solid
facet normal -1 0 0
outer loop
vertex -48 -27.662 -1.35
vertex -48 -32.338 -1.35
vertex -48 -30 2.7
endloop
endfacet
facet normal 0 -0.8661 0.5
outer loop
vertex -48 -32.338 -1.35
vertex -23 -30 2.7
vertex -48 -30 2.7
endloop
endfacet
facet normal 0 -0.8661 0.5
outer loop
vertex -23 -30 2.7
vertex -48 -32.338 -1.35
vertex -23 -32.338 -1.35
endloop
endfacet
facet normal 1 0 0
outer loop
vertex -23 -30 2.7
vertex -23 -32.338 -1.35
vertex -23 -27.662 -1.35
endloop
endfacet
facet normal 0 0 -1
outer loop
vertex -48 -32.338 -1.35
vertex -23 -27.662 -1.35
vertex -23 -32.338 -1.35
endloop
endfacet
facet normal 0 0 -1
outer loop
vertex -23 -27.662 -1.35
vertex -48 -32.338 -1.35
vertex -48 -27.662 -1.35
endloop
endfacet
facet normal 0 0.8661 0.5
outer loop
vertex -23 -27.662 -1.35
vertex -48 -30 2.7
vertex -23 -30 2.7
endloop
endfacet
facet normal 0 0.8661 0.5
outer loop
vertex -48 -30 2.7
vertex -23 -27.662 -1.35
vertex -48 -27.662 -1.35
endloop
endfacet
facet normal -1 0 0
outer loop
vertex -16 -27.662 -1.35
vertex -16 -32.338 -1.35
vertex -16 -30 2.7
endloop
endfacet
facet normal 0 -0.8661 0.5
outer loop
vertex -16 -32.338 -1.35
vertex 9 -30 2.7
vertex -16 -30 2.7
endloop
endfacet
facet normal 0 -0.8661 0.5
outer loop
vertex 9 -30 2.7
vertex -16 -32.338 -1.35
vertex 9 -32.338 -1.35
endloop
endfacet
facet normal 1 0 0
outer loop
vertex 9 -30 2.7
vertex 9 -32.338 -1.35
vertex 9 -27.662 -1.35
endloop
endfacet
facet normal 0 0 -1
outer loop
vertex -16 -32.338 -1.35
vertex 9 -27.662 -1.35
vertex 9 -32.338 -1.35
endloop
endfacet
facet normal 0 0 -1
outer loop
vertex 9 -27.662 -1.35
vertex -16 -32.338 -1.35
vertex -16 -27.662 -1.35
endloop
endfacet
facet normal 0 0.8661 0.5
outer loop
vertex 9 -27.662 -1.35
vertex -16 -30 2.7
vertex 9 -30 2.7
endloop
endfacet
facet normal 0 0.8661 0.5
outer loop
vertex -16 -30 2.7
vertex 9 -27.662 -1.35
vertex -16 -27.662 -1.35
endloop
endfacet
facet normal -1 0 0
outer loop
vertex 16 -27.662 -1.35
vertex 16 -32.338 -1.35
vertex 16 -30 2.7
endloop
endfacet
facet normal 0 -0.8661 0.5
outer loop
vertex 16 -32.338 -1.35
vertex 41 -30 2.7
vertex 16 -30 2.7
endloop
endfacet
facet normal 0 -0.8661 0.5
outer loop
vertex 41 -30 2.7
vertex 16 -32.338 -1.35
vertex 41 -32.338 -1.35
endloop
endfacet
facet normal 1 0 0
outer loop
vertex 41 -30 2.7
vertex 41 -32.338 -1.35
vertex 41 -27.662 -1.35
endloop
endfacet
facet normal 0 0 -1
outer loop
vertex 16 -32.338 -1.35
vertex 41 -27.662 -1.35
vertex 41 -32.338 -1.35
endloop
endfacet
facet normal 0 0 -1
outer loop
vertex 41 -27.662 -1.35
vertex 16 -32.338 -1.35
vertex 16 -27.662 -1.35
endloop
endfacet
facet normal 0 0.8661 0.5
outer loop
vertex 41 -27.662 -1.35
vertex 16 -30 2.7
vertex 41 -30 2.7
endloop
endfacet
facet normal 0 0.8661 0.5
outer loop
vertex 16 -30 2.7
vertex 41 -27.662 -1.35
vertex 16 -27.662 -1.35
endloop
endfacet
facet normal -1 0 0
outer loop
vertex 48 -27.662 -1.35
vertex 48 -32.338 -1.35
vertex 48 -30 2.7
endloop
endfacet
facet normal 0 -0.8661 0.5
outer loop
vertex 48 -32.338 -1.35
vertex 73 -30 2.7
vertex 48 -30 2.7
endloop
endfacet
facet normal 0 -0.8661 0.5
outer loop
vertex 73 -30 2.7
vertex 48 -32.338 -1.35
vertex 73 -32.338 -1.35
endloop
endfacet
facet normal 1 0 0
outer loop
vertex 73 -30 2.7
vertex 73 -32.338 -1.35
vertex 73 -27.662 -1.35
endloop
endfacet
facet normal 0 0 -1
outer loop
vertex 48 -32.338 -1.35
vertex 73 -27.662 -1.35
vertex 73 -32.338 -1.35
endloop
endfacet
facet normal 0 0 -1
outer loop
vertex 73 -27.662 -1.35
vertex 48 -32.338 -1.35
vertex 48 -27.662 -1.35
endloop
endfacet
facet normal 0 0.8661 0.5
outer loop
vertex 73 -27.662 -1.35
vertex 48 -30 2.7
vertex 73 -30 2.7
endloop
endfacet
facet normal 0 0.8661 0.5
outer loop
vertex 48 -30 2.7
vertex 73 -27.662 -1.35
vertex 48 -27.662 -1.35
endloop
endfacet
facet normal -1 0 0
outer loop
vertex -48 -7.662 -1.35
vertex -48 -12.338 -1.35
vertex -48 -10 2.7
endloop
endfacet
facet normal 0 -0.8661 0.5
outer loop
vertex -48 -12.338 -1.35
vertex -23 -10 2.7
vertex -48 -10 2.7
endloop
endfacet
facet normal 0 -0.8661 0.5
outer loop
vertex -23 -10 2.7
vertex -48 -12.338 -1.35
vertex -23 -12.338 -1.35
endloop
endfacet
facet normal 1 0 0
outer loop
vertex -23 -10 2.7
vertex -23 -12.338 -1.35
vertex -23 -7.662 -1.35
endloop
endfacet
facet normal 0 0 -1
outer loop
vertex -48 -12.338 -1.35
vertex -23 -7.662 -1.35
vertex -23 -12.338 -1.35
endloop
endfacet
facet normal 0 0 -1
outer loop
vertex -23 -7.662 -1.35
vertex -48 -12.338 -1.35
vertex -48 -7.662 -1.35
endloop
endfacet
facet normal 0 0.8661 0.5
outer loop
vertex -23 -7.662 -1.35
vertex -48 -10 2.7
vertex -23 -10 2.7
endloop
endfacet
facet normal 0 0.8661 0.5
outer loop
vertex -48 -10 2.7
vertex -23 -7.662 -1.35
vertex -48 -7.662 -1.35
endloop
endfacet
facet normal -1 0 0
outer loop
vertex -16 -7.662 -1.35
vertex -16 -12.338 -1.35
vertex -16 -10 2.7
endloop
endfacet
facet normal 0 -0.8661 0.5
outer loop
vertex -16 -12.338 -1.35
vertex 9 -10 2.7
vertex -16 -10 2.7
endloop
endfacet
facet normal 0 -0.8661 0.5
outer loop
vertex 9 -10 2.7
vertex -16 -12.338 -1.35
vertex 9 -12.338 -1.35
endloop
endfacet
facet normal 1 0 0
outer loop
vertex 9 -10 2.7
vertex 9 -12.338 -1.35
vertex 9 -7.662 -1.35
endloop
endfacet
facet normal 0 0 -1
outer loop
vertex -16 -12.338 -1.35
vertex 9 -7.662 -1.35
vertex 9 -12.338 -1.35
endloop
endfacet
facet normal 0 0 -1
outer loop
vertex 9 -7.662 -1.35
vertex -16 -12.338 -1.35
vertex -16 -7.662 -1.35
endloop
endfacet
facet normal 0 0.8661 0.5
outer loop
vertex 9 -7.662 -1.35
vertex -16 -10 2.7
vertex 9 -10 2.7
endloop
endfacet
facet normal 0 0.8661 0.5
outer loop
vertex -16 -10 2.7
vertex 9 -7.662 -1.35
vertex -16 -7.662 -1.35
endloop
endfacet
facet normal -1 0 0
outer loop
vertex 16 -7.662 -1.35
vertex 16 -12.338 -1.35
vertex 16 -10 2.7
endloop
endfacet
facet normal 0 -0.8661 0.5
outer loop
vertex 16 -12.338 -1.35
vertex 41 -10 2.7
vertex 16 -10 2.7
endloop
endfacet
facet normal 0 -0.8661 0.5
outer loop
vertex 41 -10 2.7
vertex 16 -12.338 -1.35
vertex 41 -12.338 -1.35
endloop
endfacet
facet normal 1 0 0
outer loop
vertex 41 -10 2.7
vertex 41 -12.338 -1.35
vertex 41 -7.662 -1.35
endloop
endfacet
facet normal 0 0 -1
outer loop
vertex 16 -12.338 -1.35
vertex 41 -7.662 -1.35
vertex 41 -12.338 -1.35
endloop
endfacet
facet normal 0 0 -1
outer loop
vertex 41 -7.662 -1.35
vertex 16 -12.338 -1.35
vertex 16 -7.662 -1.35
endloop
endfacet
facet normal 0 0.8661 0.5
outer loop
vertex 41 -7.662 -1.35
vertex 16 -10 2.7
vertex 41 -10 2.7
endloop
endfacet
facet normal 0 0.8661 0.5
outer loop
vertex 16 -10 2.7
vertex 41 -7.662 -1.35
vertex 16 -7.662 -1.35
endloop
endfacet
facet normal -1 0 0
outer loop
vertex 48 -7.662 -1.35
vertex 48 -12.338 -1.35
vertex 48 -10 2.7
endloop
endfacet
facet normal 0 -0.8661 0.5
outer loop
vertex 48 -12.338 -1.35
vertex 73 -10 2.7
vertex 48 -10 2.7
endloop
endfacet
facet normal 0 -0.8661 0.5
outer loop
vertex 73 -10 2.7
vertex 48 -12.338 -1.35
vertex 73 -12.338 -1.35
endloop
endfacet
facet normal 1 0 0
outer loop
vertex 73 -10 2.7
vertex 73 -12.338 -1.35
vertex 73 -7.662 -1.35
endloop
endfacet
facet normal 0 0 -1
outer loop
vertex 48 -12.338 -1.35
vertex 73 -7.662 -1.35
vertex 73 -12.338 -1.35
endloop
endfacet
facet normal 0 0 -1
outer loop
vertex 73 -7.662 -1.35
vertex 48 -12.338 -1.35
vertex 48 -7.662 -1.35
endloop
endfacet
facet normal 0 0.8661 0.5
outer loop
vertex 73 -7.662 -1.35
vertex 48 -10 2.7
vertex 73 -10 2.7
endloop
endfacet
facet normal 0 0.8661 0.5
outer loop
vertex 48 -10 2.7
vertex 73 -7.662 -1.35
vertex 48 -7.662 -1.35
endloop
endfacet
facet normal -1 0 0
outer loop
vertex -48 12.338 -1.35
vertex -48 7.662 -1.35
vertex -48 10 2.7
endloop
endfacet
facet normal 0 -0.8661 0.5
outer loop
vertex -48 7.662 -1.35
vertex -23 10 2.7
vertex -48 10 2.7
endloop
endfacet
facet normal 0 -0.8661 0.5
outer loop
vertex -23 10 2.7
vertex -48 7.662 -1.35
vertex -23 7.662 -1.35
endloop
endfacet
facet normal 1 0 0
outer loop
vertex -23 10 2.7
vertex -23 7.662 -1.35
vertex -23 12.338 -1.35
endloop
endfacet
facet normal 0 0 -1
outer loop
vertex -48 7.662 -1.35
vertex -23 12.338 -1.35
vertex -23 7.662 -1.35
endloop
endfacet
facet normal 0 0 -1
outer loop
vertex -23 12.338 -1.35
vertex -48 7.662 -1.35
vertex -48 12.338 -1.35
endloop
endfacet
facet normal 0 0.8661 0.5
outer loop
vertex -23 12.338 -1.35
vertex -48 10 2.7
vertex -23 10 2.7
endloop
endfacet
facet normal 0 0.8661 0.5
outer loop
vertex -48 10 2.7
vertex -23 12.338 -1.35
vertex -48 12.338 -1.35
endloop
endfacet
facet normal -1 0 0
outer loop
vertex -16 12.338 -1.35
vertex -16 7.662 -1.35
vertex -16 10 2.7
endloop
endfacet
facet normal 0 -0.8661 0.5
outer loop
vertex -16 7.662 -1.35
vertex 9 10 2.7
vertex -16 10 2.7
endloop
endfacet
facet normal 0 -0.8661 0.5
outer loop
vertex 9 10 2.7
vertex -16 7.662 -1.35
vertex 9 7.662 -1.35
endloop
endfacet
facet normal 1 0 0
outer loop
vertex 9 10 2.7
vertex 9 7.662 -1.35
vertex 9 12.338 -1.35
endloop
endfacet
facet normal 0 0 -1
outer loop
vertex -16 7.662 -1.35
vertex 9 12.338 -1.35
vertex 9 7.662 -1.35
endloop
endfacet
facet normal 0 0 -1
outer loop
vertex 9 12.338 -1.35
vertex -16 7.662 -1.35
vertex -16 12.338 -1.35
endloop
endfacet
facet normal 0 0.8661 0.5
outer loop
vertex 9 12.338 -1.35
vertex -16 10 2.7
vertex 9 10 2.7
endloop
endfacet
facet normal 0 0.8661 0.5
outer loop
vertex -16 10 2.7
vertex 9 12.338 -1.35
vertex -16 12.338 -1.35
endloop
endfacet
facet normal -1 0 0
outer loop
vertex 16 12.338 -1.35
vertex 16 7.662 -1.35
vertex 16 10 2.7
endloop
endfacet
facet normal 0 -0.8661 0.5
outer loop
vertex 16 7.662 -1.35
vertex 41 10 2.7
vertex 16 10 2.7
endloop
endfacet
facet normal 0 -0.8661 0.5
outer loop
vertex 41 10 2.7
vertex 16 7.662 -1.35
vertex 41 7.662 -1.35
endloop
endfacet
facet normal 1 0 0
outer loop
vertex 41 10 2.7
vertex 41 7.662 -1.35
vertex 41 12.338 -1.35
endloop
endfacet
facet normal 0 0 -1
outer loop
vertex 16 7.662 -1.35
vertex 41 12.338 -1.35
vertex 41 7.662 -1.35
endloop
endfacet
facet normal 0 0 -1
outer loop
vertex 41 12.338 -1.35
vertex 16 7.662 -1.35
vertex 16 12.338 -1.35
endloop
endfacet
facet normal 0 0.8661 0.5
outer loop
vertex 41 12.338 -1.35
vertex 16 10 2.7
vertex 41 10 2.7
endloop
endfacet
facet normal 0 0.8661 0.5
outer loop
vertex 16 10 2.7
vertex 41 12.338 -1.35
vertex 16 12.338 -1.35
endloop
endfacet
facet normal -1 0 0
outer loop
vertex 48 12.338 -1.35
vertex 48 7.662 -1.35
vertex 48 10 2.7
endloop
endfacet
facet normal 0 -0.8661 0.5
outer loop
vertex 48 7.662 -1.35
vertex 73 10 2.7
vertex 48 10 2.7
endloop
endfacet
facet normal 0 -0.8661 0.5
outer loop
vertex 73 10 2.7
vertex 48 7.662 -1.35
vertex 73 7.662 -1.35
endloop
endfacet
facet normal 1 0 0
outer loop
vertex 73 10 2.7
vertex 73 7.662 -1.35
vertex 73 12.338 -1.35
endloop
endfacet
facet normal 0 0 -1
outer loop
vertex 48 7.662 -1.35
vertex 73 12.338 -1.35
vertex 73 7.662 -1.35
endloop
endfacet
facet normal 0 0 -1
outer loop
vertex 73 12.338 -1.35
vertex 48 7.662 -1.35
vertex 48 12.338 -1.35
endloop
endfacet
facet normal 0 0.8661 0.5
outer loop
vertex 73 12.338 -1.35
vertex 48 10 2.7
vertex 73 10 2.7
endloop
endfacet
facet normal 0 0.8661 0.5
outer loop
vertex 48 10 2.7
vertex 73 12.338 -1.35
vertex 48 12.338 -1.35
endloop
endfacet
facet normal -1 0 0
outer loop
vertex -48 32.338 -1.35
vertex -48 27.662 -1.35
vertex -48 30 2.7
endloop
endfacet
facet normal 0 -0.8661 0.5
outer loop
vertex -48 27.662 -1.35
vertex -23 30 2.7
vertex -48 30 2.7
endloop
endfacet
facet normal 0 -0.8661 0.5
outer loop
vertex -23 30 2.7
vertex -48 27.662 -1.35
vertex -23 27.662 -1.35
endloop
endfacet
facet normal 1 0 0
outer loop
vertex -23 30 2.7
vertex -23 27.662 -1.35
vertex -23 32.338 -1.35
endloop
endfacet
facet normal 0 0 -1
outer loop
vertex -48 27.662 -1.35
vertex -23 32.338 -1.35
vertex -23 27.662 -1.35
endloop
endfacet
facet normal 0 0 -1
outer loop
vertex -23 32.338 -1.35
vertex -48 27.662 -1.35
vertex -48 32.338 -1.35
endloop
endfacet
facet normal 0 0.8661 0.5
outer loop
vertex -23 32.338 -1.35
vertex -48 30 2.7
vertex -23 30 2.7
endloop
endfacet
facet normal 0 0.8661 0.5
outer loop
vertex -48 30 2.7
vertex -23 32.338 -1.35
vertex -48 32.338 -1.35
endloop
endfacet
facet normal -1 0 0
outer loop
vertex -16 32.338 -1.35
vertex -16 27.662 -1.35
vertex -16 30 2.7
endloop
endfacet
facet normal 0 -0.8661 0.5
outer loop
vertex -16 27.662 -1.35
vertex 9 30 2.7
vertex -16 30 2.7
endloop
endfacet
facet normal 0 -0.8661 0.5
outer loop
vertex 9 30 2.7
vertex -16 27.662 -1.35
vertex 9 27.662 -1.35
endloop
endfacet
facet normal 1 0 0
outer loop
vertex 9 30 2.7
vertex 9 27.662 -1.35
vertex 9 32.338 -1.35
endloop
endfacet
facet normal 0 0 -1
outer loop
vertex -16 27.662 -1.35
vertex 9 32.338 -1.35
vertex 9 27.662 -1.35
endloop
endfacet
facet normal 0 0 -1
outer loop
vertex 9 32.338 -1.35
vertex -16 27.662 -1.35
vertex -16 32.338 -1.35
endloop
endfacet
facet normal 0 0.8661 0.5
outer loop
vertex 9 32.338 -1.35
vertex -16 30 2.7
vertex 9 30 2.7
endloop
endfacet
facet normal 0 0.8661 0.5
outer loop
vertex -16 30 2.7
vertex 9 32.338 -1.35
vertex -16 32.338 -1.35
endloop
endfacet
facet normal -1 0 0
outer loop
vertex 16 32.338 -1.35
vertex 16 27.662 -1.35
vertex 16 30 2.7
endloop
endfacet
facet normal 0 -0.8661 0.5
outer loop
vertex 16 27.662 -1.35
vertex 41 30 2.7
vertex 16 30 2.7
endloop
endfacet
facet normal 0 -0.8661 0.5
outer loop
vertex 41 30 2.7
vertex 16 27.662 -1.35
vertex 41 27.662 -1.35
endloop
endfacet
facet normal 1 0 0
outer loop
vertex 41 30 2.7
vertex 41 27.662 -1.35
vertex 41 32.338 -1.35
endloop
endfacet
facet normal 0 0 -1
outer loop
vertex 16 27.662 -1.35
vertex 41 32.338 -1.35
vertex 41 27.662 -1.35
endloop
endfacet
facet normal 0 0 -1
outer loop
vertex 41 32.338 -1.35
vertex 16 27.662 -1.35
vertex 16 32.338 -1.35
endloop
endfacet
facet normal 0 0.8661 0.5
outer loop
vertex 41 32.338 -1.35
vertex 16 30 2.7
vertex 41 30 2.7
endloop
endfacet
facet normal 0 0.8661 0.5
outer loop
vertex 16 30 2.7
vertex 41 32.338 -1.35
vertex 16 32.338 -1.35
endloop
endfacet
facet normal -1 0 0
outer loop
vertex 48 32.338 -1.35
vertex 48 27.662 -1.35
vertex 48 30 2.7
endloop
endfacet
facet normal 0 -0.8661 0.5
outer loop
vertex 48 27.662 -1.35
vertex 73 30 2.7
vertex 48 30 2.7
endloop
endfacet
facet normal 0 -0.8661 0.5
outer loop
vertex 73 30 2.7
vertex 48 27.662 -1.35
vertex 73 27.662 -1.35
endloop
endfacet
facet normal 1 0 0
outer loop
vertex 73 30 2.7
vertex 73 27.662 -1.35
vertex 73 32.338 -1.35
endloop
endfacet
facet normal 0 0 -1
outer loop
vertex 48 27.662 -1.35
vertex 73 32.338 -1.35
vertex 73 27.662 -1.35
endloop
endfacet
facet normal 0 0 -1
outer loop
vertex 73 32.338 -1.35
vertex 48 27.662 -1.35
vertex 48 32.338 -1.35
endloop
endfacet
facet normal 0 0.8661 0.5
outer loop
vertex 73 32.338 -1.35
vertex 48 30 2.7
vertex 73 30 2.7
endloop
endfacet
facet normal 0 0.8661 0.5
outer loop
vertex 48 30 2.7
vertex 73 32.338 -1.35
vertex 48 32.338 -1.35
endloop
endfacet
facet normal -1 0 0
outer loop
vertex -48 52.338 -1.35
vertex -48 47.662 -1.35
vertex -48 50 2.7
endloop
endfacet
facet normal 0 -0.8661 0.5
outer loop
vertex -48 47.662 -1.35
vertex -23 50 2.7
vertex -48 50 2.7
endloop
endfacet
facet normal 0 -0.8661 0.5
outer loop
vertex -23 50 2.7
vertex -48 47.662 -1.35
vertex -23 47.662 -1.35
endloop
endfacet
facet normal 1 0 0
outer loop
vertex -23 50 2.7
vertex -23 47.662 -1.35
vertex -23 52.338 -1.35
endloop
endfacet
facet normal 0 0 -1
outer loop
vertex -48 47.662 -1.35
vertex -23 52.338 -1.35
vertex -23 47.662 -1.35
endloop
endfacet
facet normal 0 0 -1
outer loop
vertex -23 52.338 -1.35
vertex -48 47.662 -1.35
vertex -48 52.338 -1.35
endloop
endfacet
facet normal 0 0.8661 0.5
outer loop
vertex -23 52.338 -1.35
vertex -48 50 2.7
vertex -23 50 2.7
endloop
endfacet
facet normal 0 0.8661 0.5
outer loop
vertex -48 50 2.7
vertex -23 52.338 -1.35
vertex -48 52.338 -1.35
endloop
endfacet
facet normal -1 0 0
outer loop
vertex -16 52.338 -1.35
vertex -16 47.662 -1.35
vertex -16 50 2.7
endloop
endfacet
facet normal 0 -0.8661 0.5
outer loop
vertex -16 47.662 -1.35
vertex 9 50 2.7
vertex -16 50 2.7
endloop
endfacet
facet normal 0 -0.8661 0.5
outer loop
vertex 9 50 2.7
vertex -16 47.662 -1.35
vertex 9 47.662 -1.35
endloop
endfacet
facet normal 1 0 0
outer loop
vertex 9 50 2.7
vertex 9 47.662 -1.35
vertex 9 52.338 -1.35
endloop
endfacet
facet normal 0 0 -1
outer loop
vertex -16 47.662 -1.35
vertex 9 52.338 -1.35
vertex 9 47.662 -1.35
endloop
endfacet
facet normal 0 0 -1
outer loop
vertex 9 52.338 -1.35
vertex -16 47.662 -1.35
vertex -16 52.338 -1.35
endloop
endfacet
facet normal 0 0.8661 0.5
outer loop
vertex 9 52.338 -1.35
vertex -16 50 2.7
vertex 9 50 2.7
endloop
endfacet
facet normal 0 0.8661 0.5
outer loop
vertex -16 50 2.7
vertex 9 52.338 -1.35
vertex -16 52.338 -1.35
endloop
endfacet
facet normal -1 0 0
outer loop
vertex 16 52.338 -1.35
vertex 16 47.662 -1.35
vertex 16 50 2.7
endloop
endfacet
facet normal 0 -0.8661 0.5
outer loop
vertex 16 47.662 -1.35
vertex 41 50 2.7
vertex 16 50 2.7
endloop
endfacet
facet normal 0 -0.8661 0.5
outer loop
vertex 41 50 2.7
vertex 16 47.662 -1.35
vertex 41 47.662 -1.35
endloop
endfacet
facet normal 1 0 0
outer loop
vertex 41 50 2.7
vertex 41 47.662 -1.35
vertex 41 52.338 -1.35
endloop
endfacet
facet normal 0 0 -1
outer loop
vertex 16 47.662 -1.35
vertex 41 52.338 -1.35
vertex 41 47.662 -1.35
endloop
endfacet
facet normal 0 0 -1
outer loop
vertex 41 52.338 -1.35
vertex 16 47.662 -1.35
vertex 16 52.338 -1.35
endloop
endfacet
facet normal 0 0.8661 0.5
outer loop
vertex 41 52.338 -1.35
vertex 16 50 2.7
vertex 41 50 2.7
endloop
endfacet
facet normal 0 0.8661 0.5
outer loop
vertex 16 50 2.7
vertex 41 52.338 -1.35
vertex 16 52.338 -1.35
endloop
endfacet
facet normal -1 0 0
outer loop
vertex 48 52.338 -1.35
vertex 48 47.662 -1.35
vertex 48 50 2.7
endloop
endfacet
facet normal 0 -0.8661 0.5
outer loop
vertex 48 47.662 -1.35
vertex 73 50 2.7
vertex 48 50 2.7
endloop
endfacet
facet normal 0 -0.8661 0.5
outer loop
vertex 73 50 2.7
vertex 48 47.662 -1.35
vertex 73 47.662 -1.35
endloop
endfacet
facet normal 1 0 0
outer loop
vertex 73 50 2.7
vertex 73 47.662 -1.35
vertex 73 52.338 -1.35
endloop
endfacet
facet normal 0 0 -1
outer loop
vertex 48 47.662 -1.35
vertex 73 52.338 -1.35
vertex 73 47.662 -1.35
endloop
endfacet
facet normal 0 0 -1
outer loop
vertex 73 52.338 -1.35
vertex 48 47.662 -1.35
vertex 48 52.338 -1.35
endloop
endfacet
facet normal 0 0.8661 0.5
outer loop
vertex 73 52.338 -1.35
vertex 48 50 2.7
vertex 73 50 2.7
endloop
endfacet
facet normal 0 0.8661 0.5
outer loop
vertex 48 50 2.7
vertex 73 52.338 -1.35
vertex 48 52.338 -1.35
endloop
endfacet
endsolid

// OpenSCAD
module step(len, mod)
{
	for (i = [0:$children-1])
		translate([ len*(i - ($children-1)/2), 0, 0 ]) children((i+mod) % $children);
}

for (i = [1:5])
{
	translate([0, -50+i*20, 0]) step(32, i)
	{
      triangulo_base();
      triangulo_base();
      triangulo_base();
      triangulo_base();
	}
}


module triangulo_base(){
  rotate([0, 90, 0]) {
    rotate(-30){
      triangle_tube(25, 5.4/2, 5.4/2);
    }
  }
}

//triangle_tube(20, 5, 5);
module triangle_tube(height,radius,wall)
{
   tubify(radius,wall) triangle_prism(height,radius);
}

//Tubifies any regular prism
module tubify(radius,wall)
{
  difference()
  {
    child(0);
    translate([0, 0, -0.1]) scale([(radius-wall)/radius, (radius-wall)/radius, 2]) child(0);
  }
}

module triangle_prism(height,radius)
{
  linear_extrude(height=height) triangle(radius);
}

module triangle(radius)
{
  o=radius/2;		//equivalent to radius*sin(30)
  a=radius*sqrt(3)/2;	//equivalent to radius*cos(30)
  polygon(points=[[-a,-o],[0,radius],[a,-o]],paths=[[0,1,2]]);
}
